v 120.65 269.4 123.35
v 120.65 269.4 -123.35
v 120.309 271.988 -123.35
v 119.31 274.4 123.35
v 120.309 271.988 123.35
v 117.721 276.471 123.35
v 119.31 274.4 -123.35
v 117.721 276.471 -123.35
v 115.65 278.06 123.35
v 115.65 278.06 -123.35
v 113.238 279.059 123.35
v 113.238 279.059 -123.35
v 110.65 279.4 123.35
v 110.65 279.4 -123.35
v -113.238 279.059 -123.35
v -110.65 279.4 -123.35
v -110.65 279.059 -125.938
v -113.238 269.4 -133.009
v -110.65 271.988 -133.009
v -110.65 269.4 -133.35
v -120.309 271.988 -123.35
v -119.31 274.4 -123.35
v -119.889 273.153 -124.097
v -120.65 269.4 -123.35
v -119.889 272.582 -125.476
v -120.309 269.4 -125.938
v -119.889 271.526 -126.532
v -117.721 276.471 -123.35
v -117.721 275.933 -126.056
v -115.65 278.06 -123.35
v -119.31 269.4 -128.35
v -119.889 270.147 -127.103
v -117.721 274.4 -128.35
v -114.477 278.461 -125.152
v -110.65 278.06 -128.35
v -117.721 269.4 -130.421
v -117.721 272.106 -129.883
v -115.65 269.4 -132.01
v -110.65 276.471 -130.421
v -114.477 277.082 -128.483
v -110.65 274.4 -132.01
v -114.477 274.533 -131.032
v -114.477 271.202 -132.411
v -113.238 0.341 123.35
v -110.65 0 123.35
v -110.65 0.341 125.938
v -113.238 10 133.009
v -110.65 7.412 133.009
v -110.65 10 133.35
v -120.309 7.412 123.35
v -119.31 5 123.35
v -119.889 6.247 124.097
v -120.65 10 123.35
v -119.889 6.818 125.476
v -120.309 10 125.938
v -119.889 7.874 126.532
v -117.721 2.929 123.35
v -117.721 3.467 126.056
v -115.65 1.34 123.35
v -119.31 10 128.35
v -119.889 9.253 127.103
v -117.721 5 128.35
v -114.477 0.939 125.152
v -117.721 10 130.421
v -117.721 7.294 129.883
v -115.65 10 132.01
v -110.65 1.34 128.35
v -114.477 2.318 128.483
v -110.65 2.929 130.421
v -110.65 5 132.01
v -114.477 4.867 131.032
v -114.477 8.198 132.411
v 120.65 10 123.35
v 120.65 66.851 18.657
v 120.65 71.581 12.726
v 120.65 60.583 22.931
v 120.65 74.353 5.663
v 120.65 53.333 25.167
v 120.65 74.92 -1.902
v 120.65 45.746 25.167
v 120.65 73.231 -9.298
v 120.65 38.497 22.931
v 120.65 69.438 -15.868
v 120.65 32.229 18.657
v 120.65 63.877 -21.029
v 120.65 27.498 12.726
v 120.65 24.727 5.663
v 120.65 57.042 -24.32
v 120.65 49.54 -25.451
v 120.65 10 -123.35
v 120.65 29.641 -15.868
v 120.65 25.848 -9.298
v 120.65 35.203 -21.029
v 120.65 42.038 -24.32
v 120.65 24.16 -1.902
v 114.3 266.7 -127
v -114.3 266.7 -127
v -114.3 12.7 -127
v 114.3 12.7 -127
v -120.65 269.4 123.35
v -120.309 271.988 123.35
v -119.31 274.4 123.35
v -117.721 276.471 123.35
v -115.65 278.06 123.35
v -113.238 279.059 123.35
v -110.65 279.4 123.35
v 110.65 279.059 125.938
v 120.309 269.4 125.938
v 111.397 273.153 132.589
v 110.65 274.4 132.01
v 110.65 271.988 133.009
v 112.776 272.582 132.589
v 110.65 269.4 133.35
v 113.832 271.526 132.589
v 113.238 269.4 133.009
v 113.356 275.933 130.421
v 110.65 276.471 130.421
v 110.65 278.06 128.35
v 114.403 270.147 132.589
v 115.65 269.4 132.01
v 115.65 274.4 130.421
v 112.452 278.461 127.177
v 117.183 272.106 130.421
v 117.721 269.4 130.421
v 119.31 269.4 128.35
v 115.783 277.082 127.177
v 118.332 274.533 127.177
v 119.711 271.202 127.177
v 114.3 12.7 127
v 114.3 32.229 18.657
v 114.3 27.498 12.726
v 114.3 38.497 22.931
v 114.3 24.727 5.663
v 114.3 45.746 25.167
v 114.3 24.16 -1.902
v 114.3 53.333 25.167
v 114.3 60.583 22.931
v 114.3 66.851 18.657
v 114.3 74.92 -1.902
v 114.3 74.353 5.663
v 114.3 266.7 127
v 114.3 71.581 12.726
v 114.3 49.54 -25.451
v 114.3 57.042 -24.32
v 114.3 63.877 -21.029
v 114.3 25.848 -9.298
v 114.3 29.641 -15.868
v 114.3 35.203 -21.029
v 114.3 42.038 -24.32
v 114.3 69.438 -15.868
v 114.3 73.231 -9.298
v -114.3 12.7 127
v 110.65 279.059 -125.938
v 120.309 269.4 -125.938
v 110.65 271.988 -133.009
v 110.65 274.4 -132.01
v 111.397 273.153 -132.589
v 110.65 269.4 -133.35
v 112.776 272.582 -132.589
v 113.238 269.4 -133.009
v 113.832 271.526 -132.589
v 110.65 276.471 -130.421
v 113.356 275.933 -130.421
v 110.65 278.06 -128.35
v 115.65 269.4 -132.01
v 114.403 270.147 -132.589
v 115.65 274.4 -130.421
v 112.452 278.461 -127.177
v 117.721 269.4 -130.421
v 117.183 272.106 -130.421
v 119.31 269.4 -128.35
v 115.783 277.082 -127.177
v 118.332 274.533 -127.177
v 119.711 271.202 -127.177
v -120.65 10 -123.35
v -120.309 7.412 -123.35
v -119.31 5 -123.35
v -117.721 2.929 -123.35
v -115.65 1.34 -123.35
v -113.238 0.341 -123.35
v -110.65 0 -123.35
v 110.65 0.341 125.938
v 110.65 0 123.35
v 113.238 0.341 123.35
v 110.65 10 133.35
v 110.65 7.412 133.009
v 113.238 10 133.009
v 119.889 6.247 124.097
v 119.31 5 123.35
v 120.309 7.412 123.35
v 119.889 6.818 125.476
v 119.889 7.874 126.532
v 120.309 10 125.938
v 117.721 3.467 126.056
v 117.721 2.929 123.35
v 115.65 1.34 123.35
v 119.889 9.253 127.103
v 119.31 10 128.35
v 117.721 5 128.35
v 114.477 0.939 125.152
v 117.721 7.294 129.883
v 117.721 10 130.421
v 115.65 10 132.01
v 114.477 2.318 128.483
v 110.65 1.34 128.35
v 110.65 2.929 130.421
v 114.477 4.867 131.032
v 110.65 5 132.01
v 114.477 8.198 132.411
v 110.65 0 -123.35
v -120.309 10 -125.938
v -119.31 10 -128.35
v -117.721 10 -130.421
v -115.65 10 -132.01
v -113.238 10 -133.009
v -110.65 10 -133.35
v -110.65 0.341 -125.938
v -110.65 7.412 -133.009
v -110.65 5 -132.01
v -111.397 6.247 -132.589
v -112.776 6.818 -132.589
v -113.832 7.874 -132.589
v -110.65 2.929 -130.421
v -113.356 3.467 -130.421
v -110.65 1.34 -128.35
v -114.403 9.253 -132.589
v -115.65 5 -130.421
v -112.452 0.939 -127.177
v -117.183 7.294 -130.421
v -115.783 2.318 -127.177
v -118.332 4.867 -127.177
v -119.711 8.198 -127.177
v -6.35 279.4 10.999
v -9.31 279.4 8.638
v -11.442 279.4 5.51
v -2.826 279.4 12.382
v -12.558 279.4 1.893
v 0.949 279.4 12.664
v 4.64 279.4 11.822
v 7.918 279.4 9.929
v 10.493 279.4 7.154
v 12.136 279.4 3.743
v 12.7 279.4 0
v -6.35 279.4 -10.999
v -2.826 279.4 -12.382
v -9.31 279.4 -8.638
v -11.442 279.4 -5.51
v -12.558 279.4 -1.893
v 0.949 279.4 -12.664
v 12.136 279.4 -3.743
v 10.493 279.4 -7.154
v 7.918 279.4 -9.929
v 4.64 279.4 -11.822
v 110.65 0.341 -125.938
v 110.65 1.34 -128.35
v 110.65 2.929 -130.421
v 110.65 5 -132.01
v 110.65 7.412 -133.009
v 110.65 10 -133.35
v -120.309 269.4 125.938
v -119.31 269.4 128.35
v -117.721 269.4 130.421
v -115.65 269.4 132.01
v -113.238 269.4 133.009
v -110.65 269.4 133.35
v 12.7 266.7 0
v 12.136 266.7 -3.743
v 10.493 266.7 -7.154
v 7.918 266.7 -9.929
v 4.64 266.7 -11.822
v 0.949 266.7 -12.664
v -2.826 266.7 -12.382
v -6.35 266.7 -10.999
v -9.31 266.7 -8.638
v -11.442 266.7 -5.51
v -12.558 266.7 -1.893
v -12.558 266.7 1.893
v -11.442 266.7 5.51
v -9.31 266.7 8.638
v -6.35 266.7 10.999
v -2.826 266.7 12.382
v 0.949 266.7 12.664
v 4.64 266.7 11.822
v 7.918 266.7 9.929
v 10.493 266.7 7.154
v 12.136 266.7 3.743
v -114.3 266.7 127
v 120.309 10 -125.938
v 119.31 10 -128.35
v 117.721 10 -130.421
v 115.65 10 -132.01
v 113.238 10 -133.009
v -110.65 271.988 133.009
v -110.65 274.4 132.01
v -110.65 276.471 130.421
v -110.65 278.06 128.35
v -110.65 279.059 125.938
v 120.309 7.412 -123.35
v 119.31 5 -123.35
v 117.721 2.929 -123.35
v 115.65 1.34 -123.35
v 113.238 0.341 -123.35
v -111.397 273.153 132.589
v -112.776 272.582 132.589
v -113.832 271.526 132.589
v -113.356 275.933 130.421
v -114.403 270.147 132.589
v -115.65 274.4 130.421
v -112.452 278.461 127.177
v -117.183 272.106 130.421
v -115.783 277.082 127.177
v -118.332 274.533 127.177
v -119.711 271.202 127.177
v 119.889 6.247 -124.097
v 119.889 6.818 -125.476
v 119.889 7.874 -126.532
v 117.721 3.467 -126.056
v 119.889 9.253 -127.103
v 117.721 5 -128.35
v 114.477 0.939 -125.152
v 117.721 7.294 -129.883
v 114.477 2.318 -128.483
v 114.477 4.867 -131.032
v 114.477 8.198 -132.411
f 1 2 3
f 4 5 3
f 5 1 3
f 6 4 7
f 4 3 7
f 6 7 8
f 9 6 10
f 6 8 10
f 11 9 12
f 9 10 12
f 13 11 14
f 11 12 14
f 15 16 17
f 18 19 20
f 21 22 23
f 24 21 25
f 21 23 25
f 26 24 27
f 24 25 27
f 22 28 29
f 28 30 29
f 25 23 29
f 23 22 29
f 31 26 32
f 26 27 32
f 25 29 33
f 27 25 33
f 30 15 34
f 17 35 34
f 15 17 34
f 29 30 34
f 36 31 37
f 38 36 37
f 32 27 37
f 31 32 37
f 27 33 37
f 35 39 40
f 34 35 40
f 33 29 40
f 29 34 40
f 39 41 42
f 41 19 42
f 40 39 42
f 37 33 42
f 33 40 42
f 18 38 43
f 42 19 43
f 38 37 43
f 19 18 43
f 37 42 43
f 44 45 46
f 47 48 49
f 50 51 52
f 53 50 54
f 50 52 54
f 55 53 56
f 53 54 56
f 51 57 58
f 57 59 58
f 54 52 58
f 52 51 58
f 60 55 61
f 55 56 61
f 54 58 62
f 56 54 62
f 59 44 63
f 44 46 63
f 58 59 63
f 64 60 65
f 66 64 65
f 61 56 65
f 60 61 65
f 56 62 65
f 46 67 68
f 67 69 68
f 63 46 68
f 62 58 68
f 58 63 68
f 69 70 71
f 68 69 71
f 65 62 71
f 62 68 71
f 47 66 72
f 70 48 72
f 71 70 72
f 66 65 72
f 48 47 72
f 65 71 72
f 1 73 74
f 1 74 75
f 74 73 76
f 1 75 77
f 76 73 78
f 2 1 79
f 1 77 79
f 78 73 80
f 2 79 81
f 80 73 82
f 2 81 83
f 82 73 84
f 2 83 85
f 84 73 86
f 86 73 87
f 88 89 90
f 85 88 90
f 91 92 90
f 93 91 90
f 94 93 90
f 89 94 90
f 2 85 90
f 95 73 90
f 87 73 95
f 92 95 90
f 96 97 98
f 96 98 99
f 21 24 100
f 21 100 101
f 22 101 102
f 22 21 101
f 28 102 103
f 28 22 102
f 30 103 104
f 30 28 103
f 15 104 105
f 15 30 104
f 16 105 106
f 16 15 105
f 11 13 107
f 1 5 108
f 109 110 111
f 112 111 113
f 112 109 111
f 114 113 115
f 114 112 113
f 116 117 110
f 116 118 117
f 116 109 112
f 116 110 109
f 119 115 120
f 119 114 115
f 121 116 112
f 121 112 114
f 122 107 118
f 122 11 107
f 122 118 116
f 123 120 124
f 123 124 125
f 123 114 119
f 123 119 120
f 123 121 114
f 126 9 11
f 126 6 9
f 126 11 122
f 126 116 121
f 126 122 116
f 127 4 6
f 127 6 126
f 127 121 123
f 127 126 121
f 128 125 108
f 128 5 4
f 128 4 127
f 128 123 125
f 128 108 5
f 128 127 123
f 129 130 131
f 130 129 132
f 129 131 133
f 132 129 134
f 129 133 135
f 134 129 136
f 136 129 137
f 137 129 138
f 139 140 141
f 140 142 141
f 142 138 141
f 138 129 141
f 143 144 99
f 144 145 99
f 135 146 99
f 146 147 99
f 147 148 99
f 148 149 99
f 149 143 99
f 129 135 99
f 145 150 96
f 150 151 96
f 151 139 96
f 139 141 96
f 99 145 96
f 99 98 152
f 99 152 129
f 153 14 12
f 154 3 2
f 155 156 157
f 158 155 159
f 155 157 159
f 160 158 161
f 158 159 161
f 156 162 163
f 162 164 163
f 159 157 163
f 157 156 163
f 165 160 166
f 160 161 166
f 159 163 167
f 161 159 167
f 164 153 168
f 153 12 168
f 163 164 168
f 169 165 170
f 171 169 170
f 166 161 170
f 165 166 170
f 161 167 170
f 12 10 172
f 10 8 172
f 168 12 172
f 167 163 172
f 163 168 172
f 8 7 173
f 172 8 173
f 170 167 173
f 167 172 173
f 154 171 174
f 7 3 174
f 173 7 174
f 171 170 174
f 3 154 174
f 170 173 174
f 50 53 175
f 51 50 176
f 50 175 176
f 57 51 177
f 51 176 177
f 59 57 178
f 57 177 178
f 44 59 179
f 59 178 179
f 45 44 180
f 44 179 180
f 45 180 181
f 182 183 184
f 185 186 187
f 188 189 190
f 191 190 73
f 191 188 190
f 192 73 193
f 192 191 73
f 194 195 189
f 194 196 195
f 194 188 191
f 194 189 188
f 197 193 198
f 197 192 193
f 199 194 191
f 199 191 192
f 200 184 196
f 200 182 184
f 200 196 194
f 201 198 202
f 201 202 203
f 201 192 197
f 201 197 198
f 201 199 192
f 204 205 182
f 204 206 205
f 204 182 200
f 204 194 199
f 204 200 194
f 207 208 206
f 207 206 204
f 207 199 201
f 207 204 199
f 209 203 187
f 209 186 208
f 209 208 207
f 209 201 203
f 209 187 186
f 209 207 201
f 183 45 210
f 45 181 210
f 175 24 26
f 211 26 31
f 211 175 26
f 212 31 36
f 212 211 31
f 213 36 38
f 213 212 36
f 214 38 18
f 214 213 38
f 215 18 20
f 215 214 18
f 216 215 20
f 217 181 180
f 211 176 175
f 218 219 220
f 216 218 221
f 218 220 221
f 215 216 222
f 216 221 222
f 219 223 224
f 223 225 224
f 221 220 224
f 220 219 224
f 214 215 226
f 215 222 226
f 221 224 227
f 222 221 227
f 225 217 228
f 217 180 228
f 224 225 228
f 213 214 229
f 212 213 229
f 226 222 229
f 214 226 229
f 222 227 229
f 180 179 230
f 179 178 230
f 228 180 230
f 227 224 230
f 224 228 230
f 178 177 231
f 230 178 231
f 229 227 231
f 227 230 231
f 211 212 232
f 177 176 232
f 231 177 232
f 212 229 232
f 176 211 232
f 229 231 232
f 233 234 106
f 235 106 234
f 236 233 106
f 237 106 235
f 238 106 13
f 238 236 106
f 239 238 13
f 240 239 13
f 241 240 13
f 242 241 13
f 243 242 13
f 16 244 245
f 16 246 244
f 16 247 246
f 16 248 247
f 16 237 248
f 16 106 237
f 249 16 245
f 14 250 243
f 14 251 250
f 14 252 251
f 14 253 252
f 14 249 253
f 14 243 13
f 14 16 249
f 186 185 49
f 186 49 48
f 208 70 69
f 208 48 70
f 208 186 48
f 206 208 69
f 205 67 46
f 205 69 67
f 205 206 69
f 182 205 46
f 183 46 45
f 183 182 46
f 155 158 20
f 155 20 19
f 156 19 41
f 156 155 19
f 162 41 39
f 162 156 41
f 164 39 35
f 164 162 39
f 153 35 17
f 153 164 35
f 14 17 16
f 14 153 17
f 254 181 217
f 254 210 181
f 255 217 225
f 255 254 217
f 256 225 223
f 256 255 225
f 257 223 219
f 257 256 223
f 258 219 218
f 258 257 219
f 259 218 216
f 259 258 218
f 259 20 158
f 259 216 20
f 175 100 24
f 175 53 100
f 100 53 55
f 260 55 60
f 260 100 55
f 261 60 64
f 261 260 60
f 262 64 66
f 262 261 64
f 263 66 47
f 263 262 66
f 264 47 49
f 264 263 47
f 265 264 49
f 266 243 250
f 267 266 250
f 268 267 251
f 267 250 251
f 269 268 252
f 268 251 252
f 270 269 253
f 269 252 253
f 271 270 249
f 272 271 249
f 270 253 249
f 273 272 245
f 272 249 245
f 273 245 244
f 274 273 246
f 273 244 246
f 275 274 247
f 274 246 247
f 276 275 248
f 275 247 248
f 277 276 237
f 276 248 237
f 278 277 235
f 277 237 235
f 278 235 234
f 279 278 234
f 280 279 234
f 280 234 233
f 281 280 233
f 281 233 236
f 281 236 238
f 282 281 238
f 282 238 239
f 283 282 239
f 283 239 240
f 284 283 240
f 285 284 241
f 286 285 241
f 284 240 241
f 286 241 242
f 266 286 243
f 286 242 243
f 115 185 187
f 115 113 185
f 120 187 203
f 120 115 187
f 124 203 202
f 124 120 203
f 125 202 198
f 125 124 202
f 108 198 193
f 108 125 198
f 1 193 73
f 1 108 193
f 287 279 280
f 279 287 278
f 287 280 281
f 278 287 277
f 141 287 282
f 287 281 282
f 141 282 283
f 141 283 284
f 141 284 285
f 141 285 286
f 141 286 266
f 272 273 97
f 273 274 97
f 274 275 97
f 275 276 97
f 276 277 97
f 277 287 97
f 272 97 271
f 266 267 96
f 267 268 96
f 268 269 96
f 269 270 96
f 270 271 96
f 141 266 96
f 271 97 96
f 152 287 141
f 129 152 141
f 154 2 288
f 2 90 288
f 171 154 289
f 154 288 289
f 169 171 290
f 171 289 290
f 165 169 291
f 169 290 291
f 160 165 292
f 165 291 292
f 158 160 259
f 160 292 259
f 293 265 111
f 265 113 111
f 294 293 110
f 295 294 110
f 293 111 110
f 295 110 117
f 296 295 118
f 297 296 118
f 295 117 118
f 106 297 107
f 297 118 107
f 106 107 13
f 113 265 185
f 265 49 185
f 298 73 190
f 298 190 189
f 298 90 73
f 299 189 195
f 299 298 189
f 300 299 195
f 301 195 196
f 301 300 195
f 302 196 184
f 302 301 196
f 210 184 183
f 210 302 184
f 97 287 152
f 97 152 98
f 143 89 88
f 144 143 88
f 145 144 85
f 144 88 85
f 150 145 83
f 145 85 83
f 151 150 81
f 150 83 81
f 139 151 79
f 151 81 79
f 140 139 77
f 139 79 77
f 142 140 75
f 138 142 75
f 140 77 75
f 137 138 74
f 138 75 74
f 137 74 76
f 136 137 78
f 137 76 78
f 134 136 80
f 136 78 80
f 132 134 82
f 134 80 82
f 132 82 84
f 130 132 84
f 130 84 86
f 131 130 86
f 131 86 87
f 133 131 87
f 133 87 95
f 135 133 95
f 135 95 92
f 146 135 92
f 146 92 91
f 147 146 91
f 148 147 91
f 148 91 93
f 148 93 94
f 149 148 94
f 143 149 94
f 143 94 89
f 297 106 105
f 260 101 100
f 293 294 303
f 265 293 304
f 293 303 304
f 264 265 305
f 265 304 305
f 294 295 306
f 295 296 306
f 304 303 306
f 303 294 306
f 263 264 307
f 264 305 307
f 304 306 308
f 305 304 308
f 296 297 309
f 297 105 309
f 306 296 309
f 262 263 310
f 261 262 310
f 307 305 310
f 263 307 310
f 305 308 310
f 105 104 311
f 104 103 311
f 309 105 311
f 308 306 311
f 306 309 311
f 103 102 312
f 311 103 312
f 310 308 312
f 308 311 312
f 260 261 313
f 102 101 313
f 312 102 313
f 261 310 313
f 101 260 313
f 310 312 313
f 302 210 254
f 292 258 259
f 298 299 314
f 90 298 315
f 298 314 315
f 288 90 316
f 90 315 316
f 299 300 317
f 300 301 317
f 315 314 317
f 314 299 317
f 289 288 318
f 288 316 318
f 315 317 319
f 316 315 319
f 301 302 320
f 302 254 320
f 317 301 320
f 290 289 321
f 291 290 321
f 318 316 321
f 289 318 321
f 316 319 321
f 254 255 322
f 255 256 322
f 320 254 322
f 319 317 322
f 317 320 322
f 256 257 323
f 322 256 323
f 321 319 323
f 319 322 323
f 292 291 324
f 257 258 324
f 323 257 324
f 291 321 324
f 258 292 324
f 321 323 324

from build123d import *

# Parameters (mm, degrees)
SKETCH1_W           = 241.3
SKETCH1_H           = 266.7
BOSS_EXTRUDE1_DEPTH = 266.7
SKETCH8_W           = 228.6
SKETCH8_H           = 254
CUT_EXTRUDE4_DEPTH  = 254
SKETCH9_W           = 241.3
SKETCH9_H           = 266.7
BOSS_EXTRUDE3_DEPTH = 12.7
FILLET4_R           = 10
SKETCH10_R          = 25.4510398
CUT_EXTRUDE5_DEPTH  = 12.7
SKETCH11_R          = 12.7
CUT_EXTRUDE6_DEPTH  = 12.7


with BuildPart() as part:
    # Sketch1 → Boss-Extrude1 (new body)
    with BuildSketch(Plane(origin=(0, 0, 0), x_dir=(1, 0, 0), z_dir=(0, 1, 0))):
        Rectangle(SKETCH1_W, SKETCH1_H)
    extrude(amount=BOSS_EXTRUDE1_DEPTH)

    # Sketch8 → Cut-Extrude4 (cut)
    with BuildSketch(Plane(origin=(0, 266.7, 0), x_dir=(1, 0, 0), z_dir=(0, 1, 0))):
        Rectangle(SKETCH8_W, SKETCH8_H)
    extrude(amount=-CUT_EXTRUDE4_DEPTH, mode=Mode.SUBTRACT)

    # Sketch9 → Boss-Extrude3 (add)
    with BuildSketch(Plane(origin=(0, 266.7, 0), x_dir=(1, 0, 0), z_dir=(0, 1, 0))):
        Rectangle(SKETCH9_W, SKETCH9_H)
    extrude(amount=BOSS_EXTRUDE3_DEPTH)

    # Fillet4
    fillet4_edges = [part.edges().sort_by_distance(p)[0] for p in [
        (120.65, 279.4, 0),
        (0, 279.4, -133.35),
        (-120.65, 279.4, 0),
        (0, 279.4, 133.35),
        (0, 0, 133.35),
        (-120.65, 0, 0),
        (0, 0, -133.35),
        (120.65, 0, 0),
        (120.65, 139.7, 133.35),
        (-120.65, 139.7, 133.35),
        (-120.65, 139.7, -133.35),
        (120.65, 139.7, -133.35),
    ]]
    fillet(fillet4_edges, radius=FILLET4_R)

    # Sketch10 → Cut-Extrude5 (cut)
    with BuildSketch(Plane(origin=(120.65, 0, 0), x_dir=(0, 0, -1), z_dir=(1, 0, 0))):
        with Locations((0, 49.53971752)):
            Circle(SKETCH10_R)
    extrude(amount=-CUT_EXTRUDE5_DEPTH, mode=Mode.SUBTRACT)

    # Sketch11 → Cut-Extrude6 (cut)
    with BuildSketch(Plane(origin=(0, 279.4, 0), x_dir=(1, 0, 0), z_dir=(0, 1, 0))):
        Circle(SKETCH11_R)
    extrude(amount=-CUT_EXTRUDE6_DEPTH, mode=Mode.SUBTRACT)


solid = part.part
